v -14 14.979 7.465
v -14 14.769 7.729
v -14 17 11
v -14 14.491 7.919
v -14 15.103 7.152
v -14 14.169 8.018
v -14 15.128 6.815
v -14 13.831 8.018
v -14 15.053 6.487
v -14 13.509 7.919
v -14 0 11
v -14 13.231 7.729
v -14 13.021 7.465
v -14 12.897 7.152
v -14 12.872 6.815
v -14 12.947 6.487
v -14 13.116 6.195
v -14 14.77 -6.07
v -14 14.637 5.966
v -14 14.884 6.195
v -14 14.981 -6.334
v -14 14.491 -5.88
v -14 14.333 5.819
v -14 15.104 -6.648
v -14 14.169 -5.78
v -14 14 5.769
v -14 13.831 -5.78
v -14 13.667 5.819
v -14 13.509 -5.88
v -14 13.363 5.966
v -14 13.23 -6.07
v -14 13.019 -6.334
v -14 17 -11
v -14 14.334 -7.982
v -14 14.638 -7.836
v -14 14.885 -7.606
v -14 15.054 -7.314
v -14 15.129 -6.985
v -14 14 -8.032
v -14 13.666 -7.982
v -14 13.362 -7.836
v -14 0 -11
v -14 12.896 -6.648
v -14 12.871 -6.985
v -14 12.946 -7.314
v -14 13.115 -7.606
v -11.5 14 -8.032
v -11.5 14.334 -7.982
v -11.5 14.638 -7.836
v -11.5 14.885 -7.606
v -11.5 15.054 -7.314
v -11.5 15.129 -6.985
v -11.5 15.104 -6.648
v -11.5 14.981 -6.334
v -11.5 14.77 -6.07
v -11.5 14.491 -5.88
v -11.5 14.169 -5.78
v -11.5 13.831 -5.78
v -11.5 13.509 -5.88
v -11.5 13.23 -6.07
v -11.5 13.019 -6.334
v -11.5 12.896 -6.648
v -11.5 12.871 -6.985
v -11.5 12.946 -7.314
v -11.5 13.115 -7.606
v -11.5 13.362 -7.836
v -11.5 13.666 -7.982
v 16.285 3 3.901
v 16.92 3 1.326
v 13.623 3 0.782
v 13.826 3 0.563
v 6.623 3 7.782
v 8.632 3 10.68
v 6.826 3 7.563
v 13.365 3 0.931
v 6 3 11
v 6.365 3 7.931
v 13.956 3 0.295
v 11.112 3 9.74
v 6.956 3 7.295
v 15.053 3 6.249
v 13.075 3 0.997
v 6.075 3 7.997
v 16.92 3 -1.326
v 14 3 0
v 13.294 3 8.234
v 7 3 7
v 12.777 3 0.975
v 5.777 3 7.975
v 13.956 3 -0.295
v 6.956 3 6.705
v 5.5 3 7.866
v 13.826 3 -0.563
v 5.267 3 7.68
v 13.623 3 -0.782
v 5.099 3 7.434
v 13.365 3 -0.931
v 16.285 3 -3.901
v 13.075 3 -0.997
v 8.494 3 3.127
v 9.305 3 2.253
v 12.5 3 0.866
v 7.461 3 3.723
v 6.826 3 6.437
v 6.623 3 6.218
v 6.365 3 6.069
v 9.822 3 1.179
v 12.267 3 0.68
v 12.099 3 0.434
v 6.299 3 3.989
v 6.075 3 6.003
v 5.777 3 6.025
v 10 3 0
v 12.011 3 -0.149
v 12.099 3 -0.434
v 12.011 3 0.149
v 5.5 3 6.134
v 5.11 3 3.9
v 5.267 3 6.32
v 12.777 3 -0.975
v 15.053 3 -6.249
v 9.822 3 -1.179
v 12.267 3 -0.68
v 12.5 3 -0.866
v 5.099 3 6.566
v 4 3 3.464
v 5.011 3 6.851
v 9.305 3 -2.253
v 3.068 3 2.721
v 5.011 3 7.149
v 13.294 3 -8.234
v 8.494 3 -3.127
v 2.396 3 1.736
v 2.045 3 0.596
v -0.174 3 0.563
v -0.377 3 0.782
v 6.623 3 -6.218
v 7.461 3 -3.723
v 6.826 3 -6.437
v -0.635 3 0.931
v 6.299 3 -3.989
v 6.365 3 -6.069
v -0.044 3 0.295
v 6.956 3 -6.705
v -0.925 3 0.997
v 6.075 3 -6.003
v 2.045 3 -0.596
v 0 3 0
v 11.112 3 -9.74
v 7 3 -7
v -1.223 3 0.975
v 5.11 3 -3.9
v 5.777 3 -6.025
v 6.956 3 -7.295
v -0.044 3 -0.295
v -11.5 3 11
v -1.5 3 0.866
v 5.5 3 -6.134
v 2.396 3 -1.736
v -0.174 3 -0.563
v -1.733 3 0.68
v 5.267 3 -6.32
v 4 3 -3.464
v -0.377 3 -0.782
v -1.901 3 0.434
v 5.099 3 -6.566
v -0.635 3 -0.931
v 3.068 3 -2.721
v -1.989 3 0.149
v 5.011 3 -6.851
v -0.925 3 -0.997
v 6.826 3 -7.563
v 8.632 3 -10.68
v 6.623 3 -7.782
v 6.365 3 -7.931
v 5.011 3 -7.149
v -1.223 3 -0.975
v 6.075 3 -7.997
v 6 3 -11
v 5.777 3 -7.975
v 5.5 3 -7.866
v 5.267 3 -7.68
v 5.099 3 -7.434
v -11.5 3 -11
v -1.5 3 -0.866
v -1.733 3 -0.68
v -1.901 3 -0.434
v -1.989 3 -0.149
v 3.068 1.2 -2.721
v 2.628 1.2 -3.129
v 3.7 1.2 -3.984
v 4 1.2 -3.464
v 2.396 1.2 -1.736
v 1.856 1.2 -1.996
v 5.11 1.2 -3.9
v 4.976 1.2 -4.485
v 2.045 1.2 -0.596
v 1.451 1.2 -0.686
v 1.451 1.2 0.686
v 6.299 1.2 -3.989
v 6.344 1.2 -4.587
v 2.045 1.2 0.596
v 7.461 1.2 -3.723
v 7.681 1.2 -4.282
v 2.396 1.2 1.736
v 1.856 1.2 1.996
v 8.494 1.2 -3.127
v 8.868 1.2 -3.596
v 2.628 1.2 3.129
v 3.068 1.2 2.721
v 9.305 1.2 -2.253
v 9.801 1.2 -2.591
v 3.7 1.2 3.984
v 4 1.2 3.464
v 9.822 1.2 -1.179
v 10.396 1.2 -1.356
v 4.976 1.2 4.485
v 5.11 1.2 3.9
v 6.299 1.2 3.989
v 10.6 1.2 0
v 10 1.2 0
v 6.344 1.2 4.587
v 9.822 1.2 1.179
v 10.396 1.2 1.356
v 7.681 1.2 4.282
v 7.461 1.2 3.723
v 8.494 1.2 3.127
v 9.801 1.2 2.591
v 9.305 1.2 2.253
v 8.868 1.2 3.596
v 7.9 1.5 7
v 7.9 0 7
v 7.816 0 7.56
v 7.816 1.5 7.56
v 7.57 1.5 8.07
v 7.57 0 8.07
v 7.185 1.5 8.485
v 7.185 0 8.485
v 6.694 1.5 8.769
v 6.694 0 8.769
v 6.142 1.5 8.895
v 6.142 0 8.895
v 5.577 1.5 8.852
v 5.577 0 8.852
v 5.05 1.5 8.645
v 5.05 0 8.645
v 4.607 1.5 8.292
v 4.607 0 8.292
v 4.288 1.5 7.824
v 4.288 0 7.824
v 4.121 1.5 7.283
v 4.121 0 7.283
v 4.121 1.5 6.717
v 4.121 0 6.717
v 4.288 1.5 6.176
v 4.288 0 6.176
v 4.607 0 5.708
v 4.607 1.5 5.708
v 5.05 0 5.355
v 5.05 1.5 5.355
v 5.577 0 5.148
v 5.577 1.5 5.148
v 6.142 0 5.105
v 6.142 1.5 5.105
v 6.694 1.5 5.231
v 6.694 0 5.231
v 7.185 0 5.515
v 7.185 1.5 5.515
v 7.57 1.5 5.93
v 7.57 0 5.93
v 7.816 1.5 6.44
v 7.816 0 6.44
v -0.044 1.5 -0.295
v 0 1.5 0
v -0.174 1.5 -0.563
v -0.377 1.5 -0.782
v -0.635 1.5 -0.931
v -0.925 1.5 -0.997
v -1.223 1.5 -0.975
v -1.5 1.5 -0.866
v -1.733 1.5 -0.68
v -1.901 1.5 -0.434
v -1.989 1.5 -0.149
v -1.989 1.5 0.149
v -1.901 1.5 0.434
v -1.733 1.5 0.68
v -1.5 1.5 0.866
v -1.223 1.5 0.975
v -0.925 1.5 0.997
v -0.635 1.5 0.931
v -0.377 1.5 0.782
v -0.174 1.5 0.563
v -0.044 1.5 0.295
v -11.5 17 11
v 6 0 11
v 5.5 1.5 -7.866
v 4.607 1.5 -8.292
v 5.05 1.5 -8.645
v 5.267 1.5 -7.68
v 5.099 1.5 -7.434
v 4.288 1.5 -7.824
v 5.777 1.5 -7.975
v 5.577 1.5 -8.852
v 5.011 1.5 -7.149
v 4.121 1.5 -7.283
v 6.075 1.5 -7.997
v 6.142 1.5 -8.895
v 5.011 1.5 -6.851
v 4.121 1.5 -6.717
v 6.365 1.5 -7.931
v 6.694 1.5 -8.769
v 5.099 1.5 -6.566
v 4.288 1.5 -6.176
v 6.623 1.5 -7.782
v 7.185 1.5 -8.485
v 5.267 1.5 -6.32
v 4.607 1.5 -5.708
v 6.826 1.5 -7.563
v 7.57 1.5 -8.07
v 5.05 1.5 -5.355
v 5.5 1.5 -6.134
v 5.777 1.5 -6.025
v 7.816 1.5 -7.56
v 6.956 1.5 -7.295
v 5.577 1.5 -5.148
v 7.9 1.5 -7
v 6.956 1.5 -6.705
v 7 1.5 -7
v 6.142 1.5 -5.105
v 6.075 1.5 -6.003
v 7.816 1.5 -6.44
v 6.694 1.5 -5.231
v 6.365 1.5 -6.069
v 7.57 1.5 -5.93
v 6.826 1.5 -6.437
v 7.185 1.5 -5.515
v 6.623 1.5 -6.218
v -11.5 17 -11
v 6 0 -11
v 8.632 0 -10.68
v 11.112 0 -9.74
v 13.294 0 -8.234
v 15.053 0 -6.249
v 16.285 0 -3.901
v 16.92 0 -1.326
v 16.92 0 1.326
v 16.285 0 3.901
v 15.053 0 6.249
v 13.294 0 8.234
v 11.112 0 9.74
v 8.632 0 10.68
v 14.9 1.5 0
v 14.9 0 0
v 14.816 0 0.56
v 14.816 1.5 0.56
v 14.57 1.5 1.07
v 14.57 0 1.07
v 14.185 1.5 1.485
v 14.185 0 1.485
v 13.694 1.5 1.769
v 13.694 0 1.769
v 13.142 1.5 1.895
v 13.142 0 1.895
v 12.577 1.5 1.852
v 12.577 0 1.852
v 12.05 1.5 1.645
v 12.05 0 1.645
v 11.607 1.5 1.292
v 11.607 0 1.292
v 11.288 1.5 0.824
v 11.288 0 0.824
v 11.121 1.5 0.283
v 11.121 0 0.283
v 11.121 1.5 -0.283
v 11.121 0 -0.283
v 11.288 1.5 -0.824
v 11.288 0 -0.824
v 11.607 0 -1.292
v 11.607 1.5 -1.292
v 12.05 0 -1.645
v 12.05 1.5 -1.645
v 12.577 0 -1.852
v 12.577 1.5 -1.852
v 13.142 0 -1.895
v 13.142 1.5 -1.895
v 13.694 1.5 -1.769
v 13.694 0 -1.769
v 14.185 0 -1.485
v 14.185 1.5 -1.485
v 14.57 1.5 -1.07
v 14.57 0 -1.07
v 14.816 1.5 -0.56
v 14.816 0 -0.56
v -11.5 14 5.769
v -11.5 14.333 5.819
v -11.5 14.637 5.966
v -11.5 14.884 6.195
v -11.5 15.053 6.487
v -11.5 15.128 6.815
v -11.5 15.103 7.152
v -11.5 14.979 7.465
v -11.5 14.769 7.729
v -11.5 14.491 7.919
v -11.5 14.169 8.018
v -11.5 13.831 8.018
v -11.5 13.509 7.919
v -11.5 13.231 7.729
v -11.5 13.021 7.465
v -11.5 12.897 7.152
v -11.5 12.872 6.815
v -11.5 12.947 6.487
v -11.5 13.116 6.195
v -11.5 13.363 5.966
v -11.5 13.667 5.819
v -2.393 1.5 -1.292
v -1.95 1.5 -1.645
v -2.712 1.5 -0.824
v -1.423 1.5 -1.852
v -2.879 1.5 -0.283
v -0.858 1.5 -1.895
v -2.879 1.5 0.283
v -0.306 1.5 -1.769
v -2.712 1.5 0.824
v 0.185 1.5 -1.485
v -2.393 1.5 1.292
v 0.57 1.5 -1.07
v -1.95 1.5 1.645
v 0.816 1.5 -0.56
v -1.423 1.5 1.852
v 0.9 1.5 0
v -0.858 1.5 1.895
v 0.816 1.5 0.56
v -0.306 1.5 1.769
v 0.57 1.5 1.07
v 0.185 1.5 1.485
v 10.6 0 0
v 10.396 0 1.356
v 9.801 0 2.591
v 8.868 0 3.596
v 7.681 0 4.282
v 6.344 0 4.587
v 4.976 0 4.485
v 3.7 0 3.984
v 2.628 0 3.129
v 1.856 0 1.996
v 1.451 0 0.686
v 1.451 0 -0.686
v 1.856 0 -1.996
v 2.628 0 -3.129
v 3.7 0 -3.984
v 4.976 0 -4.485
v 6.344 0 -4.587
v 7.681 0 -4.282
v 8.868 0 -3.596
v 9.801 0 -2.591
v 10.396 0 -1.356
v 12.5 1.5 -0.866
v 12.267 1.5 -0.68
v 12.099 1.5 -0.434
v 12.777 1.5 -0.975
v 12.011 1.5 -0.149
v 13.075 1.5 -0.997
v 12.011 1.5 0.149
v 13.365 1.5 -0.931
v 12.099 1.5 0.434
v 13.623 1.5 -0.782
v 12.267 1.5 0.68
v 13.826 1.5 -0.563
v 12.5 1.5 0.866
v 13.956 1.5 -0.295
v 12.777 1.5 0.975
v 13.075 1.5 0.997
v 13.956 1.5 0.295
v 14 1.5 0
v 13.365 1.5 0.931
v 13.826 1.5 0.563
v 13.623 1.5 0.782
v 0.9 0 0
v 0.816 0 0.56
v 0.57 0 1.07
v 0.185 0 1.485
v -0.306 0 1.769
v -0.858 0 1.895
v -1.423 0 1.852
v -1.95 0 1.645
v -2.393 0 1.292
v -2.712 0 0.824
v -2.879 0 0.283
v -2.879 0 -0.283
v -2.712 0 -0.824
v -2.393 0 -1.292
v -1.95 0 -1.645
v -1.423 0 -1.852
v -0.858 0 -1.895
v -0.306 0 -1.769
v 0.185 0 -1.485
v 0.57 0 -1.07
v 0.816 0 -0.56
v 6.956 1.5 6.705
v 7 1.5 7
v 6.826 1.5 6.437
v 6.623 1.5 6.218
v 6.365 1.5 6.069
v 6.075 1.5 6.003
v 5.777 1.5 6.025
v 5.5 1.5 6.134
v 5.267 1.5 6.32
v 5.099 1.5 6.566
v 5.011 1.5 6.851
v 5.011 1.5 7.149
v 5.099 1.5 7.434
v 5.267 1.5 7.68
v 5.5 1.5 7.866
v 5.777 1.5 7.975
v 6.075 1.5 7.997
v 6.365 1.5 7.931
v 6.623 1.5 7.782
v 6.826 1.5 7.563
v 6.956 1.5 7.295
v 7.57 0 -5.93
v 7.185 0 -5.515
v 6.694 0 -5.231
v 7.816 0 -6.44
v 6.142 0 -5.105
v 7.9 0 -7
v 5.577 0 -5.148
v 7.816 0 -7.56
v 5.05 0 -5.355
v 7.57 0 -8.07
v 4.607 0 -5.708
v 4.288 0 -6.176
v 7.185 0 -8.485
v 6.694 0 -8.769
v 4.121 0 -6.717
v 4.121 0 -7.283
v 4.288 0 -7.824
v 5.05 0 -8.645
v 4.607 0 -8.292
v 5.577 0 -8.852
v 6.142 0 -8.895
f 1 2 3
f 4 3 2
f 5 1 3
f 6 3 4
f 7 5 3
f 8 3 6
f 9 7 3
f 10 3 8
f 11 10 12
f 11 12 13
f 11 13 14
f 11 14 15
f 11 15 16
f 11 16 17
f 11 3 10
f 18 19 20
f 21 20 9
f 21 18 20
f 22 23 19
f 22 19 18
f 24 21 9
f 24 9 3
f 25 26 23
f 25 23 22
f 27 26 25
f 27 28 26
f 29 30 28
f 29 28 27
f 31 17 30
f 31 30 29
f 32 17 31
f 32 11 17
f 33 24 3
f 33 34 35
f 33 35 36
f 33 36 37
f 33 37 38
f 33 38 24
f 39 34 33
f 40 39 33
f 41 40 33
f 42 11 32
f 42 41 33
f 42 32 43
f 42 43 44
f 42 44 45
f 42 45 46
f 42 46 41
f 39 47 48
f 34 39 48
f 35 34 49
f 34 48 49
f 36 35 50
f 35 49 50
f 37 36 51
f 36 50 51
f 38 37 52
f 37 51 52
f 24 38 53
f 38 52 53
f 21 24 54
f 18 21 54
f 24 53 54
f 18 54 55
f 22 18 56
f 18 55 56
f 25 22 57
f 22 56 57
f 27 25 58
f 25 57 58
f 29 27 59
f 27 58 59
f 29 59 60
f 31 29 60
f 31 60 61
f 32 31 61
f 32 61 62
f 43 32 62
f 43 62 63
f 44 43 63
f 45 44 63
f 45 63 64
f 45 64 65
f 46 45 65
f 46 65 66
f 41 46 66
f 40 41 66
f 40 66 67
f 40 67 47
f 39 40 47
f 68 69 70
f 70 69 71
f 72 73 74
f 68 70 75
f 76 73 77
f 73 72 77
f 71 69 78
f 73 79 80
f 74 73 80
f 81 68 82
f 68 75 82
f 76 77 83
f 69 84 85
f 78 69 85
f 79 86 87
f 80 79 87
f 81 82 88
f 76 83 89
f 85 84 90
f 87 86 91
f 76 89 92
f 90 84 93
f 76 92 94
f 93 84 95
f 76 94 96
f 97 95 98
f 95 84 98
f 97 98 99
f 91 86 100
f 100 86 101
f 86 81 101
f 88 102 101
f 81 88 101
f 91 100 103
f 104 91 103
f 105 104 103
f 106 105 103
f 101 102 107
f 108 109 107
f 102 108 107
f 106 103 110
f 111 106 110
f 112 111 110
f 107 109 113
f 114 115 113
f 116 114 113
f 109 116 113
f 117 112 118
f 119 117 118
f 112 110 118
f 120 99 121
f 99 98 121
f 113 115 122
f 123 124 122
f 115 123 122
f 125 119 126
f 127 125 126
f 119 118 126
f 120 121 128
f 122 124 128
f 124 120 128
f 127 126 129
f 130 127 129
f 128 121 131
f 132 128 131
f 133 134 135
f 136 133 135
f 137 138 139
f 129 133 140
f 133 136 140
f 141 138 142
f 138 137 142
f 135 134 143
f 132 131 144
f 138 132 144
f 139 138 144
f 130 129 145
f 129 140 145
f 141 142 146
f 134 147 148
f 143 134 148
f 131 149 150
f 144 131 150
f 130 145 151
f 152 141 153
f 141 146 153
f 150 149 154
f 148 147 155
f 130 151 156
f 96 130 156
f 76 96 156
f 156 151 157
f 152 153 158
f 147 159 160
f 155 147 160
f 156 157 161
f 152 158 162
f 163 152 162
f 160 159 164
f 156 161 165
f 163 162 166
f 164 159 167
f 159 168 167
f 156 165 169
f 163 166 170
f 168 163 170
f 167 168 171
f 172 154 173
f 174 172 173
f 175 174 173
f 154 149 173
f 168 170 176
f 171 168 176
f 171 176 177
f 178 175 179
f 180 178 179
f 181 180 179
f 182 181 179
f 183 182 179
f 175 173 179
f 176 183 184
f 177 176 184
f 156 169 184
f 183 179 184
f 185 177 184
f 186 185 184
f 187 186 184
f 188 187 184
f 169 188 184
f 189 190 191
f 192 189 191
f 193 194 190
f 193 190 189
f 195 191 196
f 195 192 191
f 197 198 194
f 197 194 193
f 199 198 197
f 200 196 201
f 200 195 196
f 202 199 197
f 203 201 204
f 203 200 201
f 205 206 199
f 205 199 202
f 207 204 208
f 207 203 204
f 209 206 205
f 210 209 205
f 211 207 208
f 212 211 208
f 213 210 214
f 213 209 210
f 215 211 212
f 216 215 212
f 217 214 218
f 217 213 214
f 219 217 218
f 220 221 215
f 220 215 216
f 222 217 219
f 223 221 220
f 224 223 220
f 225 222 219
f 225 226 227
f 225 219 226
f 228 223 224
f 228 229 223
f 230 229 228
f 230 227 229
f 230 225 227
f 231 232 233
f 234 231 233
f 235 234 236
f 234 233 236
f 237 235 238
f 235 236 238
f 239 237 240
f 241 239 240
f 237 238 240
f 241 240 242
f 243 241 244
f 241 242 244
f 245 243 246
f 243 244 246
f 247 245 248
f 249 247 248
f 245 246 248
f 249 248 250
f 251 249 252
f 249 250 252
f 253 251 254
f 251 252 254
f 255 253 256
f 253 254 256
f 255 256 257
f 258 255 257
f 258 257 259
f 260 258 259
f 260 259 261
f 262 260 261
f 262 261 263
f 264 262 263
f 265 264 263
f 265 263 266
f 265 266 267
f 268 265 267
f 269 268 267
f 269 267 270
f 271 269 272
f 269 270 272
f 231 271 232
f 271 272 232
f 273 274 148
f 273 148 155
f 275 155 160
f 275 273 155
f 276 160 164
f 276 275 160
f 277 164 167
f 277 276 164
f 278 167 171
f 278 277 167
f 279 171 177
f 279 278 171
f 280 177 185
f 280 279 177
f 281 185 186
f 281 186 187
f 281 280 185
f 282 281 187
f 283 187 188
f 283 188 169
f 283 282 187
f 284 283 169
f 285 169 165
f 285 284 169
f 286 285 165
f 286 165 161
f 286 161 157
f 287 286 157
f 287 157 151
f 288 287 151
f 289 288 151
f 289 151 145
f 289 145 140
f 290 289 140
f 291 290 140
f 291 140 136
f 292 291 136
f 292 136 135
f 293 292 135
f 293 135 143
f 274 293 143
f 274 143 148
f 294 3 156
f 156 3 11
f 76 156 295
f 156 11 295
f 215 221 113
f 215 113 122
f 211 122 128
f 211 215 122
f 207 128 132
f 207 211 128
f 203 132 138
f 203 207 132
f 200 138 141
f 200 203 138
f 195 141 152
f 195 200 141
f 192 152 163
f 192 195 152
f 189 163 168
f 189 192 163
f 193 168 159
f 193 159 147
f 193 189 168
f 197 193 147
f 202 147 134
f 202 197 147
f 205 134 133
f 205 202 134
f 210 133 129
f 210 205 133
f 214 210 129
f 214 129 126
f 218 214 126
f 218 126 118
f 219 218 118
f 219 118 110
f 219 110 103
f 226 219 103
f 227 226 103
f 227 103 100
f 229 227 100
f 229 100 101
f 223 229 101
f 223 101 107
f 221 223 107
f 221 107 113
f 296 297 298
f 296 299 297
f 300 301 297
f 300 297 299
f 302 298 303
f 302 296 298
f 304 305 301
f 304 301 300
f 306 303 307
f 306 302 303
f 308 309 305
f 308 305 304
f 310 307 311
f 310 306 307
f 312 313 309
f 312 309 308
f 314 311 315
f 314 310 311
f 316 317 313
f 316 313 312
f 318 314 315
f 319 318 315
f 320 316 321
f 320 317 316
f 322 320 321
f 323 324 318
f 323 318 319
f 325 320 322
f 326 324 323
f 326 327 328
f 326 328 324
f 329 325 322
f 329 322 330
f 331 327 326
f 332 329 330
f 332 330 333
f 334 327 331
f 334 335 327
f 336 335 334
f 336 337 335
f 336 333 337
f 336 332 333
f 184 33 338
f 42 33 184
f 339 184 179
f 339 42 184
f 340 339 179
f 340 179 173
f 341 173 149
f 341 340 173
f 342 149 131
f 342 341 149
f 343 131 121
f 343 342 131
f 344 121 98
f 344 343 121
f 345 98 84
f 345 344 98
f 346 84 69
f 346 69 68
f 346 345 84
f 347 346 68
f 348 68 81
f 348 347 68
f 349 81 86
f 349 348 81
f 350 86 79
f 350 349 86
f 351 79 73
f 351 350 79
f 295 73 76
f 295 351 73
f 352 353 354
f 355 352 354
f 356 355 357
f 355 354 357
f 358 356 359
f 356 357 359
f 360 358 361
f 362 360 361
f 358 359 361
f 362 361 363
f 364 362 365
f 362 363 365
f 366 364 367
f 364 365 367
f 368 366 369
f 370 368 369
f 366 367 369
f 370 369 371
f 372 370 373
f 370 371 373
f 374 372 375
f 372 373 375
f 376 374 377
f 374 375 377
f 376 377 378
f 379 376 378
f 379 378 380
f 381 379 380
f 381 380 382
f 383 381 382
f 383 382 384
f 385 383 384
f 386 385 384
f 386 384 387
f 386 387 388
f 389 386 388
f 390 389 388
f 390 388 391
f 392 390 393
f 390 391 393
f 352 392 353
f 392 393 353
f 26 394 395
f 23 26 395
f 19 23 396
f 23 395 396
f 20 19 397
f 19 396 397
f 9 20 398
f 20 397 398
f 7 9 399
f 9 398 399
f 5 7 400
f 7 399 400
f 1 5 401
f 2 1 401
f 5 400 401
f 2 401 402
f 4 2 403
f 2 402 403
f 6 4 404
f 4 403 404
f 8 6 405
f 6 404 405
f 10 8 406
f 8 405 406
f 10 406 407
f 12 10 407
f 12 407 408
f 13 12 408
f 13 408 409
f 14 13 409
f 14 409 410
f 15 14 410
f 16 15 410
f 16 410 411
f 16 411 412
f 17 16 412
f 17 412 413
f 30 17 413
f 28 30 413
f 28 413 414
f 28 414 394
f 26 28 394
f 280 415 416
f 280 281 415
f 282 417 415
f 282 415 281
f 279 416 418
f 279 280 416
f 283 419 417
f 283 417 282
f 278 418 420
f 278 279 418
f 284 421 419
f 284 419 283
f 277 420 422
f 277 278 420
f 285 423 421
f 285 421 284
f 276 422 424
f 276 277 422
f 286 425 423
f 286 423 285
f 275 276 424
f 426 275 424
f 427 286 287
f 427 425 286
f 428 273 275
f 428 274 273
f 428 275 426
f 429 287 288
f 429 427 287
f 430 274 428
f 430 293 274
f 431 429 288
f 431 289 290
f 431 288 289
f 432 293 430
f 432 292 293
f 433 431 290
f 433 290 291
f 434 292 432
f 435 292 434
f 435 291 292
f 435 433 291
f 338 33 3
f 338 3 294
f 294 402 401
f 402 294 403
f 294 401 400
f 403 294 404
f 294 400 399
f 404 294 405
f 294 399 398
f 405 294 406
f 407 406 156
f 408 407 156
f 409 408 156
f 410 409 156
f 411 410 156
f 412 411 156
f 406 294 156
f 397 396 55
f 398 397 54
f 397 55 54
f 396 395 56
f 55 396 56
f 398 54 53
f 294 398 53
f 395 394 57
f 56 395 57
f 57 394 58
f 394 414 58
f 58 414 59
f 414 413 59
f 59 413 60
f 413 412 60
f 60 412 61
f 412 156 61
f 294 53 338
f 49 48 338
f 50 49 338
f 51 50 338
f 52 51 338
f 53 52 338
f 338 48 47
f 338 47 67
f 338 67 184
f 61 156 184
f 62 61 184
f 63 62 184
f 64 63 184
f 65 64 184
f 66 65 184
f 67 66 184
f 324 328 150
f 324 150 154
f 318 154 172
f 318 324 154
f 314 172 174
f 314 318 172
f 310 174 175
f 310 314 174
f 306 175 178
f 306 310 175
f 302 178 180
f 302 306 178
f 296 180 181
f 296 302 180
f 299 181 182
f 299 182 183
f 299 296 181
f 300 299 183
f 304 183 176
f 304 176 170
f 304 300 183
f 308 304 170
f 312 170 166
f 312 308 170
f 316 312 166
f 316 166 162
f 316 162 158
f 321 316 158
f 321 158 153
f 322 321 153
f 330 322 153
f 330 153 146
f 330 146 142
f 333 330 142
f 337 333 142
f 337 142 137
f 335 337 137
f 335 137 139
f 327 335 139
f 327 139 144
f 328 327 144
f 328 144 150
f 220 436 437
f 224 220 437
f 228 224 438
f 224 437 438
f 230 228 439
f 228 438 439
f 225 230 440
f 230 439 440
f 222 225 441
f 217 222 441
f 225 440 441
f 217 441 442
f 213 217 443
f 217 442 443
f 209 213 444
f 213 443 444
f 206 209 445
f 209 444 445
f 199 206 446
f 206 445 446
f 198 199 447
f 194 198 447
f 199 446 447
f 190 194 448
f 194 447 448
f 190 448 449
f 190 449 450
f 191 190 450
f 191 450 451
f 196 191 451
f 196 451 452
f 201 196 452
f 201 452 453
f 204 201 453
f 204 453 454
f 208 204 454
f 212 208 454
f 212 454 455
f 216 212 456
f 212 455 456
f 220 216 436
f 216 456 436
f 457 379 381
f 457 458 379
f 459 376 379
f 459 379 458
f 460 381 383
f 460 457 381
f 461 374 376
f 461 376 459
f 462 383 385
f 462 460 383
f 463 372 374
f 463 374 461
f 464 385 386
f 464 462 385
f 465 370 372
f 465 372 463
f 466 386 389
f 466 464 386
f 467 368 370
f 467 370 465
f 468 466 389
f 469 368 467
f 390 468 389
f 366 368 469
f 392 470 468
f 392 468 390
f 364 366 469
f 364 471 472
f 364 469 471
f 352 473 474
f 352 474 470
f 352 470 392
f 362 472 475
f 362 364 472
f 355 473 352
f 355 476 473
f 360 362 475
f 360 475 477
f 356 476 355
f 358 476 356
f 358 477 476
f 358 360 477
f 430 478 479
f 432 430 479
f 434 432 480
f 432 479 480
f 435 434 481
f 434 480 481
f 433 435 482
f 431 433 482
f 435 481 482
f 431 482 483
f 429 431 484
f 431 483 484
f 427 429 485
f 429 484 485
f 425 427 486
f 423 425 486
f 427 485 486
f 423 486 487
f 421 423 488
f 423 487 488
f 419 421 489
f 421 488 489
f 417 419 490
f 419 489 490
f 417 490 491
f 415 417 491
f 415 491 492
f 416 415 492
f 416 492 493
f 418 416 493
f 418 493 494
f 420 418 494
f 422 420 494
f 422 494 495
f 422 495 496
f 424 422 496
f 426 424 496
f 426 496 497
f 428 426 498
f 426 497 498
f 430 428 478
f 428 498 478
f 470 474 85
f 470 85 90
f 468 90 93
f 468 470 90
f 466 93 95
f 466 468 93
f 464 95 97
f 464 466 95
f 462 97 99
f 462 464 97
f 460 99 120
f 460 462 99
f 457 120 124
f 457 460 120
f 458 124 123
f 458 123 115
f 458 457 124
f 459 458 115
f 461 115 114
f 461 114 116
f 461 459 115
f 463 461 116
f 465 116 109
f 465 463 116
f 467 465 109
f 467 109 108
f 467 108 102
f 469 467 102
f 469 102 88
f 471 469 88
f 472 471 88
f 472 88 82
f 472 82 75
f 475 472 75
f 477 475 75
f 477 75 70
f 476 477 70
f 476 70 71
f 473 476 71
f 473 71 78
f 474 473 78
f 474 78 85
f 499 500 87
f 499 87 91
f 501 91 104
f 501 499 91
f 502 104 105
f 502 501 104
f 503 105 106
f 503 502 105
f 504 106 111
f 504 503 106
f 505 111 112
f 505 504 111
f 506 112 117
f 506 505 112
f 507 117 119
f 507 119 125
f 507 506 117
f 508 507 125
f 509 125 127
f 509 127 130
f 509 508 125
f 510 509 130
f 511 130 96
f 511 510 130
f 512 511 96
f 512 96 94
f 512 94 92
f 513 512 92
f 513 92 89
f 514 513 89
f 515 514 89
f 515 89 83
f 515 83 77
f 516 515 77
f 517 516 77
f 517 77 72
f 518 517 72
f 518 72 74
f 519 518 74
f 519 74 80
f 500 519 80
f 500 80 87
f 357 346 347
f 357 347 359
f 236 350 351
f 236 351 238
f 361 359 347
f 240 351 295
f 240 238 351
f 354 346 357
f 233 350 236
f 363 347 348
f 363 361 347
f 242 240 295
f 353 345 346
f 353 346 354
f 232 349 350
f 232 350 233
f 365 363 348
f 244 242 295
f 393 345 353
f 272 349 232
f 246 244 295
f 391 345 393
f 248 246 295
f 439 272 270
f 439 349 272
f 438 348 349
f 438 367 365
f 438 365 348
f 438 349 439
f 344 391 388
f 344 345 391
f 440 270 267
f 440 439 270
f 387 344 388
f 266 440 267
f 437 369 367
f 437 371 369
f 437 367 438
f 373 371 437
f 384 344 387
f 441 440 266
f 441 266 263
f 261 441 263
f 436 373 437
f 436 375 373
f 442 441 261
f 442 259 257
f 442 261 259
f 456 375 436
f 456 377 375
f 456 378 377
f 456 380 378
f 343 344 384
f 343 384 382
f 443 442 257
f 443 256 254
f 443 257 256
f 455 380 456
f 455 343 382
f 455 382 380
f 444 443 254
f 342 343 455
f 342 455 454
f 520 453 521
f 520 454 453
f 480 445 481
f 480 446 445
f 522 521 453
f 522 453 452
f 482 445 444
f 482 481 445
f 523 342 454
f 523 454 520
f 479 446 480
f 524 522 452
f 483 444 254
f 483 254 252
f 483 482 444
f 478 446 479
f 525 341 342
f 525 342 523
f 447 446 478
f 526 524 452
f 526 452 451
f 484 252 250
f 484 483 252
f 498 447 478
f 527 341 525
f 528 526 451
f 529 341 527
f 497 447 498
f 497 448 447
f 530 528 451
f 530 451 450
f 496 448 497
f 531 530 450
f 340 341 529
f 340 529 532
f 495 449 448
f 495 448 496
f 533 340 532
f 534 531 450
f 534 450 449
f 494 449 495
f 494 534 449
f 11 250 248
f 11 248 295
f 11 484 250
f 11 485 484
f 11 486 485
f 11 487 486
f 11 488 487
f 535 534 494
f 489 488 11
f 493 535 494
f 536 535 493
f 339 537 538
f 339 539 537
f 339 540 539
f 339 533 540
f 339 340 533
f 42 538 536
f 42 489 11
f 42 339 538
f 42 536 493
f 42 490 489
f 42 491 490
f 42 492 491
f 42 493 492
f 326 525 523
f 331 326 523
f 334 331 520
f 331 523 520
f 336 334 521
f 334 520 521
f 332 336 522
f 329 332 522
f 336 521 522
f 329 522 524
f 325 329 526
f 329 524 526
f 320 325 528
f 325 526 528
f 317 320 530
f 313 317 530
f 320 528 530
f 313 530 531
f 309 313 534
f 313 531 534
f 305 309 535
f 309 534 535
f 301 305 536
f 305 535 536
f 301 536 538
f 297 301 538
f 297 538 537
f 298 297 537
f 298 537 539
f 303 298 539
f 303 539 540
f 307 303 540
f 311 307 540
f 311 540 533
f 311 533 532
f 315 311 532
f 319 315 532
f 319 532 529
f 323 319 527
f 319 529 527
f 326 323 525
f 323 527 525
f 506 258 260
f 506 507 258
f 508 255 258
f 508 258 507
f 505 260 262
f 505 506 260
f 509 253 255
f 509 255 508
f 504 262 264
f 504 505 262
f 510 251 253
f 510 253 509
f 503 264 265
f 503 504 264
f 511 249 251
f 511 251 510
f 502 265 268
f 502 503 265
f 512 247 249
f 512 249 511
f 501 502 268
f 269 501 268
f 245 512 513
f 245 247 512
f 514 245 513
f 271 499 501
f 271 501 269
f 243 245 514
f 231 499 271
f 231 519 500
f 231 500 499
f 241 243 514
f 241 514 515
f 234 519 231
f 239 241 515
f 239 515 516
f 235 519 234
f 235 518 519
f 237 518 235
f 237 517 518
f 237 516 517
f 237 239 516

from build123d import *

# Parameters (mm, degrees)
SKETCH1_R           = 1
SKETCH1_R_2         = 4
BOSS_EXTRUDE1_DEPTH = 3
SKETCH2_W           = 2.5
SKETCH2_H           = 22
BOSS_EXTRUDE2_DEPTH = 14
SKETCH3_R           = 1.132393425
SKETCH3_R_2         = 1.130977438
CUT_EXTRUDE1_DEPTH  = 6
SKETCH4_R           = 4.6
CUT_EXTRUDE2_DEPTH  = 1.2
SKETCH5_R           = 1.9
CUT_EXTRUDE3_DEPTH  = 1.5


with BuildPart() as part:
    # Sketch1 → Boss-Extrude1 (new body)
    with BuildSketch(Plane(origin=(0, 0, 0), x_dir=(1, 0, 0), z_dir=(0, 1, 0))):
        with BuildLine():
            Line((-14, -11), (-14, 11))
            Line((-14, 11), (6, 11))
            ThreePointArc((6, 11), (17, 0), (6, -11))
            Line((6, -11), (-14, -11))
        make_face()
        with Locations((6, -7)):
            Circle(SKETCH1_R, mode=Mode.SUBTRACT)
        with Locations((-1, 0)):
            Circle(SKETCH1_R, mode=Mode.SUBTRACT)
        with Locations((6, 0)):
            Circle(SKETCH1_R_2, mode=Mode.SUBTRACT)
        with Locations((13, 0)):
            Circle(SKETCH1_R, mode=Mode.SUBTRACT)
        with Locations((6, 7)):
            Circle(SKETCH1_R, mode=Mode.SUBTRACT)
    extrude(amount=BOSS_EXTRUDE1_DEPTH)

    # Sketch2 → Boss-Extrude2 (add)
    with BuildSketch(Plane(origin=(0, 3, 0), x_dir=(1, 0, 0), z_dir=(0, 1, 0))):
        with Locations((-12.75, 0)):
            Rectangle(SKETCH2_W, SKETCH2_H)
    extrude(amount=BOSS_EXTRUDE2_DEPTH)

    # Sketch3 → Cut-Extrude1 (cut)
    with BuildSketch(Plane(origin=(-11.5, 0, 0), x_dir=(0, 0, -1), z_dir=(1, 0, 0))):
        with Locations((6.9, 14)):
            Circle(SKETCH3_R)
        with Locations((-6.9, 14)):
            Circle(SKETCH3_R_2)
    extrude(amount=-CUT_EXTRUDE1_DEPTH, mode=Mode.SUBTRACT)

    # Sketch4 → Cut-Extrude2 (cut)
    with BuildSketch(Plane.XZ):
        with Locations((6, 0)):
            Circle(SKETCH4_R)
    extrude(amount=-CUT_EXTRUDE2_DEPTH, mode=Mode.SUBTRACT)

    # Sketch5 → Cut-Extrude3 (cut)
    with BuildSketch(Plane.XZ):
        with Locations((13, 0)):
            Circle(SKETCH5_R)
        with Locations((6, -7)):
            Circle(SKETCH5_R)
        with Locations((-1, 0)):
            Circle(SKETCH5_R)
        with Locations((6, 7)):
            Circle(SKETCH5_R)
    extrude(amount=-CUT_EXTRUDE3_DEPTH, mode=Mode.SUBTRACT)


solid = part.part
